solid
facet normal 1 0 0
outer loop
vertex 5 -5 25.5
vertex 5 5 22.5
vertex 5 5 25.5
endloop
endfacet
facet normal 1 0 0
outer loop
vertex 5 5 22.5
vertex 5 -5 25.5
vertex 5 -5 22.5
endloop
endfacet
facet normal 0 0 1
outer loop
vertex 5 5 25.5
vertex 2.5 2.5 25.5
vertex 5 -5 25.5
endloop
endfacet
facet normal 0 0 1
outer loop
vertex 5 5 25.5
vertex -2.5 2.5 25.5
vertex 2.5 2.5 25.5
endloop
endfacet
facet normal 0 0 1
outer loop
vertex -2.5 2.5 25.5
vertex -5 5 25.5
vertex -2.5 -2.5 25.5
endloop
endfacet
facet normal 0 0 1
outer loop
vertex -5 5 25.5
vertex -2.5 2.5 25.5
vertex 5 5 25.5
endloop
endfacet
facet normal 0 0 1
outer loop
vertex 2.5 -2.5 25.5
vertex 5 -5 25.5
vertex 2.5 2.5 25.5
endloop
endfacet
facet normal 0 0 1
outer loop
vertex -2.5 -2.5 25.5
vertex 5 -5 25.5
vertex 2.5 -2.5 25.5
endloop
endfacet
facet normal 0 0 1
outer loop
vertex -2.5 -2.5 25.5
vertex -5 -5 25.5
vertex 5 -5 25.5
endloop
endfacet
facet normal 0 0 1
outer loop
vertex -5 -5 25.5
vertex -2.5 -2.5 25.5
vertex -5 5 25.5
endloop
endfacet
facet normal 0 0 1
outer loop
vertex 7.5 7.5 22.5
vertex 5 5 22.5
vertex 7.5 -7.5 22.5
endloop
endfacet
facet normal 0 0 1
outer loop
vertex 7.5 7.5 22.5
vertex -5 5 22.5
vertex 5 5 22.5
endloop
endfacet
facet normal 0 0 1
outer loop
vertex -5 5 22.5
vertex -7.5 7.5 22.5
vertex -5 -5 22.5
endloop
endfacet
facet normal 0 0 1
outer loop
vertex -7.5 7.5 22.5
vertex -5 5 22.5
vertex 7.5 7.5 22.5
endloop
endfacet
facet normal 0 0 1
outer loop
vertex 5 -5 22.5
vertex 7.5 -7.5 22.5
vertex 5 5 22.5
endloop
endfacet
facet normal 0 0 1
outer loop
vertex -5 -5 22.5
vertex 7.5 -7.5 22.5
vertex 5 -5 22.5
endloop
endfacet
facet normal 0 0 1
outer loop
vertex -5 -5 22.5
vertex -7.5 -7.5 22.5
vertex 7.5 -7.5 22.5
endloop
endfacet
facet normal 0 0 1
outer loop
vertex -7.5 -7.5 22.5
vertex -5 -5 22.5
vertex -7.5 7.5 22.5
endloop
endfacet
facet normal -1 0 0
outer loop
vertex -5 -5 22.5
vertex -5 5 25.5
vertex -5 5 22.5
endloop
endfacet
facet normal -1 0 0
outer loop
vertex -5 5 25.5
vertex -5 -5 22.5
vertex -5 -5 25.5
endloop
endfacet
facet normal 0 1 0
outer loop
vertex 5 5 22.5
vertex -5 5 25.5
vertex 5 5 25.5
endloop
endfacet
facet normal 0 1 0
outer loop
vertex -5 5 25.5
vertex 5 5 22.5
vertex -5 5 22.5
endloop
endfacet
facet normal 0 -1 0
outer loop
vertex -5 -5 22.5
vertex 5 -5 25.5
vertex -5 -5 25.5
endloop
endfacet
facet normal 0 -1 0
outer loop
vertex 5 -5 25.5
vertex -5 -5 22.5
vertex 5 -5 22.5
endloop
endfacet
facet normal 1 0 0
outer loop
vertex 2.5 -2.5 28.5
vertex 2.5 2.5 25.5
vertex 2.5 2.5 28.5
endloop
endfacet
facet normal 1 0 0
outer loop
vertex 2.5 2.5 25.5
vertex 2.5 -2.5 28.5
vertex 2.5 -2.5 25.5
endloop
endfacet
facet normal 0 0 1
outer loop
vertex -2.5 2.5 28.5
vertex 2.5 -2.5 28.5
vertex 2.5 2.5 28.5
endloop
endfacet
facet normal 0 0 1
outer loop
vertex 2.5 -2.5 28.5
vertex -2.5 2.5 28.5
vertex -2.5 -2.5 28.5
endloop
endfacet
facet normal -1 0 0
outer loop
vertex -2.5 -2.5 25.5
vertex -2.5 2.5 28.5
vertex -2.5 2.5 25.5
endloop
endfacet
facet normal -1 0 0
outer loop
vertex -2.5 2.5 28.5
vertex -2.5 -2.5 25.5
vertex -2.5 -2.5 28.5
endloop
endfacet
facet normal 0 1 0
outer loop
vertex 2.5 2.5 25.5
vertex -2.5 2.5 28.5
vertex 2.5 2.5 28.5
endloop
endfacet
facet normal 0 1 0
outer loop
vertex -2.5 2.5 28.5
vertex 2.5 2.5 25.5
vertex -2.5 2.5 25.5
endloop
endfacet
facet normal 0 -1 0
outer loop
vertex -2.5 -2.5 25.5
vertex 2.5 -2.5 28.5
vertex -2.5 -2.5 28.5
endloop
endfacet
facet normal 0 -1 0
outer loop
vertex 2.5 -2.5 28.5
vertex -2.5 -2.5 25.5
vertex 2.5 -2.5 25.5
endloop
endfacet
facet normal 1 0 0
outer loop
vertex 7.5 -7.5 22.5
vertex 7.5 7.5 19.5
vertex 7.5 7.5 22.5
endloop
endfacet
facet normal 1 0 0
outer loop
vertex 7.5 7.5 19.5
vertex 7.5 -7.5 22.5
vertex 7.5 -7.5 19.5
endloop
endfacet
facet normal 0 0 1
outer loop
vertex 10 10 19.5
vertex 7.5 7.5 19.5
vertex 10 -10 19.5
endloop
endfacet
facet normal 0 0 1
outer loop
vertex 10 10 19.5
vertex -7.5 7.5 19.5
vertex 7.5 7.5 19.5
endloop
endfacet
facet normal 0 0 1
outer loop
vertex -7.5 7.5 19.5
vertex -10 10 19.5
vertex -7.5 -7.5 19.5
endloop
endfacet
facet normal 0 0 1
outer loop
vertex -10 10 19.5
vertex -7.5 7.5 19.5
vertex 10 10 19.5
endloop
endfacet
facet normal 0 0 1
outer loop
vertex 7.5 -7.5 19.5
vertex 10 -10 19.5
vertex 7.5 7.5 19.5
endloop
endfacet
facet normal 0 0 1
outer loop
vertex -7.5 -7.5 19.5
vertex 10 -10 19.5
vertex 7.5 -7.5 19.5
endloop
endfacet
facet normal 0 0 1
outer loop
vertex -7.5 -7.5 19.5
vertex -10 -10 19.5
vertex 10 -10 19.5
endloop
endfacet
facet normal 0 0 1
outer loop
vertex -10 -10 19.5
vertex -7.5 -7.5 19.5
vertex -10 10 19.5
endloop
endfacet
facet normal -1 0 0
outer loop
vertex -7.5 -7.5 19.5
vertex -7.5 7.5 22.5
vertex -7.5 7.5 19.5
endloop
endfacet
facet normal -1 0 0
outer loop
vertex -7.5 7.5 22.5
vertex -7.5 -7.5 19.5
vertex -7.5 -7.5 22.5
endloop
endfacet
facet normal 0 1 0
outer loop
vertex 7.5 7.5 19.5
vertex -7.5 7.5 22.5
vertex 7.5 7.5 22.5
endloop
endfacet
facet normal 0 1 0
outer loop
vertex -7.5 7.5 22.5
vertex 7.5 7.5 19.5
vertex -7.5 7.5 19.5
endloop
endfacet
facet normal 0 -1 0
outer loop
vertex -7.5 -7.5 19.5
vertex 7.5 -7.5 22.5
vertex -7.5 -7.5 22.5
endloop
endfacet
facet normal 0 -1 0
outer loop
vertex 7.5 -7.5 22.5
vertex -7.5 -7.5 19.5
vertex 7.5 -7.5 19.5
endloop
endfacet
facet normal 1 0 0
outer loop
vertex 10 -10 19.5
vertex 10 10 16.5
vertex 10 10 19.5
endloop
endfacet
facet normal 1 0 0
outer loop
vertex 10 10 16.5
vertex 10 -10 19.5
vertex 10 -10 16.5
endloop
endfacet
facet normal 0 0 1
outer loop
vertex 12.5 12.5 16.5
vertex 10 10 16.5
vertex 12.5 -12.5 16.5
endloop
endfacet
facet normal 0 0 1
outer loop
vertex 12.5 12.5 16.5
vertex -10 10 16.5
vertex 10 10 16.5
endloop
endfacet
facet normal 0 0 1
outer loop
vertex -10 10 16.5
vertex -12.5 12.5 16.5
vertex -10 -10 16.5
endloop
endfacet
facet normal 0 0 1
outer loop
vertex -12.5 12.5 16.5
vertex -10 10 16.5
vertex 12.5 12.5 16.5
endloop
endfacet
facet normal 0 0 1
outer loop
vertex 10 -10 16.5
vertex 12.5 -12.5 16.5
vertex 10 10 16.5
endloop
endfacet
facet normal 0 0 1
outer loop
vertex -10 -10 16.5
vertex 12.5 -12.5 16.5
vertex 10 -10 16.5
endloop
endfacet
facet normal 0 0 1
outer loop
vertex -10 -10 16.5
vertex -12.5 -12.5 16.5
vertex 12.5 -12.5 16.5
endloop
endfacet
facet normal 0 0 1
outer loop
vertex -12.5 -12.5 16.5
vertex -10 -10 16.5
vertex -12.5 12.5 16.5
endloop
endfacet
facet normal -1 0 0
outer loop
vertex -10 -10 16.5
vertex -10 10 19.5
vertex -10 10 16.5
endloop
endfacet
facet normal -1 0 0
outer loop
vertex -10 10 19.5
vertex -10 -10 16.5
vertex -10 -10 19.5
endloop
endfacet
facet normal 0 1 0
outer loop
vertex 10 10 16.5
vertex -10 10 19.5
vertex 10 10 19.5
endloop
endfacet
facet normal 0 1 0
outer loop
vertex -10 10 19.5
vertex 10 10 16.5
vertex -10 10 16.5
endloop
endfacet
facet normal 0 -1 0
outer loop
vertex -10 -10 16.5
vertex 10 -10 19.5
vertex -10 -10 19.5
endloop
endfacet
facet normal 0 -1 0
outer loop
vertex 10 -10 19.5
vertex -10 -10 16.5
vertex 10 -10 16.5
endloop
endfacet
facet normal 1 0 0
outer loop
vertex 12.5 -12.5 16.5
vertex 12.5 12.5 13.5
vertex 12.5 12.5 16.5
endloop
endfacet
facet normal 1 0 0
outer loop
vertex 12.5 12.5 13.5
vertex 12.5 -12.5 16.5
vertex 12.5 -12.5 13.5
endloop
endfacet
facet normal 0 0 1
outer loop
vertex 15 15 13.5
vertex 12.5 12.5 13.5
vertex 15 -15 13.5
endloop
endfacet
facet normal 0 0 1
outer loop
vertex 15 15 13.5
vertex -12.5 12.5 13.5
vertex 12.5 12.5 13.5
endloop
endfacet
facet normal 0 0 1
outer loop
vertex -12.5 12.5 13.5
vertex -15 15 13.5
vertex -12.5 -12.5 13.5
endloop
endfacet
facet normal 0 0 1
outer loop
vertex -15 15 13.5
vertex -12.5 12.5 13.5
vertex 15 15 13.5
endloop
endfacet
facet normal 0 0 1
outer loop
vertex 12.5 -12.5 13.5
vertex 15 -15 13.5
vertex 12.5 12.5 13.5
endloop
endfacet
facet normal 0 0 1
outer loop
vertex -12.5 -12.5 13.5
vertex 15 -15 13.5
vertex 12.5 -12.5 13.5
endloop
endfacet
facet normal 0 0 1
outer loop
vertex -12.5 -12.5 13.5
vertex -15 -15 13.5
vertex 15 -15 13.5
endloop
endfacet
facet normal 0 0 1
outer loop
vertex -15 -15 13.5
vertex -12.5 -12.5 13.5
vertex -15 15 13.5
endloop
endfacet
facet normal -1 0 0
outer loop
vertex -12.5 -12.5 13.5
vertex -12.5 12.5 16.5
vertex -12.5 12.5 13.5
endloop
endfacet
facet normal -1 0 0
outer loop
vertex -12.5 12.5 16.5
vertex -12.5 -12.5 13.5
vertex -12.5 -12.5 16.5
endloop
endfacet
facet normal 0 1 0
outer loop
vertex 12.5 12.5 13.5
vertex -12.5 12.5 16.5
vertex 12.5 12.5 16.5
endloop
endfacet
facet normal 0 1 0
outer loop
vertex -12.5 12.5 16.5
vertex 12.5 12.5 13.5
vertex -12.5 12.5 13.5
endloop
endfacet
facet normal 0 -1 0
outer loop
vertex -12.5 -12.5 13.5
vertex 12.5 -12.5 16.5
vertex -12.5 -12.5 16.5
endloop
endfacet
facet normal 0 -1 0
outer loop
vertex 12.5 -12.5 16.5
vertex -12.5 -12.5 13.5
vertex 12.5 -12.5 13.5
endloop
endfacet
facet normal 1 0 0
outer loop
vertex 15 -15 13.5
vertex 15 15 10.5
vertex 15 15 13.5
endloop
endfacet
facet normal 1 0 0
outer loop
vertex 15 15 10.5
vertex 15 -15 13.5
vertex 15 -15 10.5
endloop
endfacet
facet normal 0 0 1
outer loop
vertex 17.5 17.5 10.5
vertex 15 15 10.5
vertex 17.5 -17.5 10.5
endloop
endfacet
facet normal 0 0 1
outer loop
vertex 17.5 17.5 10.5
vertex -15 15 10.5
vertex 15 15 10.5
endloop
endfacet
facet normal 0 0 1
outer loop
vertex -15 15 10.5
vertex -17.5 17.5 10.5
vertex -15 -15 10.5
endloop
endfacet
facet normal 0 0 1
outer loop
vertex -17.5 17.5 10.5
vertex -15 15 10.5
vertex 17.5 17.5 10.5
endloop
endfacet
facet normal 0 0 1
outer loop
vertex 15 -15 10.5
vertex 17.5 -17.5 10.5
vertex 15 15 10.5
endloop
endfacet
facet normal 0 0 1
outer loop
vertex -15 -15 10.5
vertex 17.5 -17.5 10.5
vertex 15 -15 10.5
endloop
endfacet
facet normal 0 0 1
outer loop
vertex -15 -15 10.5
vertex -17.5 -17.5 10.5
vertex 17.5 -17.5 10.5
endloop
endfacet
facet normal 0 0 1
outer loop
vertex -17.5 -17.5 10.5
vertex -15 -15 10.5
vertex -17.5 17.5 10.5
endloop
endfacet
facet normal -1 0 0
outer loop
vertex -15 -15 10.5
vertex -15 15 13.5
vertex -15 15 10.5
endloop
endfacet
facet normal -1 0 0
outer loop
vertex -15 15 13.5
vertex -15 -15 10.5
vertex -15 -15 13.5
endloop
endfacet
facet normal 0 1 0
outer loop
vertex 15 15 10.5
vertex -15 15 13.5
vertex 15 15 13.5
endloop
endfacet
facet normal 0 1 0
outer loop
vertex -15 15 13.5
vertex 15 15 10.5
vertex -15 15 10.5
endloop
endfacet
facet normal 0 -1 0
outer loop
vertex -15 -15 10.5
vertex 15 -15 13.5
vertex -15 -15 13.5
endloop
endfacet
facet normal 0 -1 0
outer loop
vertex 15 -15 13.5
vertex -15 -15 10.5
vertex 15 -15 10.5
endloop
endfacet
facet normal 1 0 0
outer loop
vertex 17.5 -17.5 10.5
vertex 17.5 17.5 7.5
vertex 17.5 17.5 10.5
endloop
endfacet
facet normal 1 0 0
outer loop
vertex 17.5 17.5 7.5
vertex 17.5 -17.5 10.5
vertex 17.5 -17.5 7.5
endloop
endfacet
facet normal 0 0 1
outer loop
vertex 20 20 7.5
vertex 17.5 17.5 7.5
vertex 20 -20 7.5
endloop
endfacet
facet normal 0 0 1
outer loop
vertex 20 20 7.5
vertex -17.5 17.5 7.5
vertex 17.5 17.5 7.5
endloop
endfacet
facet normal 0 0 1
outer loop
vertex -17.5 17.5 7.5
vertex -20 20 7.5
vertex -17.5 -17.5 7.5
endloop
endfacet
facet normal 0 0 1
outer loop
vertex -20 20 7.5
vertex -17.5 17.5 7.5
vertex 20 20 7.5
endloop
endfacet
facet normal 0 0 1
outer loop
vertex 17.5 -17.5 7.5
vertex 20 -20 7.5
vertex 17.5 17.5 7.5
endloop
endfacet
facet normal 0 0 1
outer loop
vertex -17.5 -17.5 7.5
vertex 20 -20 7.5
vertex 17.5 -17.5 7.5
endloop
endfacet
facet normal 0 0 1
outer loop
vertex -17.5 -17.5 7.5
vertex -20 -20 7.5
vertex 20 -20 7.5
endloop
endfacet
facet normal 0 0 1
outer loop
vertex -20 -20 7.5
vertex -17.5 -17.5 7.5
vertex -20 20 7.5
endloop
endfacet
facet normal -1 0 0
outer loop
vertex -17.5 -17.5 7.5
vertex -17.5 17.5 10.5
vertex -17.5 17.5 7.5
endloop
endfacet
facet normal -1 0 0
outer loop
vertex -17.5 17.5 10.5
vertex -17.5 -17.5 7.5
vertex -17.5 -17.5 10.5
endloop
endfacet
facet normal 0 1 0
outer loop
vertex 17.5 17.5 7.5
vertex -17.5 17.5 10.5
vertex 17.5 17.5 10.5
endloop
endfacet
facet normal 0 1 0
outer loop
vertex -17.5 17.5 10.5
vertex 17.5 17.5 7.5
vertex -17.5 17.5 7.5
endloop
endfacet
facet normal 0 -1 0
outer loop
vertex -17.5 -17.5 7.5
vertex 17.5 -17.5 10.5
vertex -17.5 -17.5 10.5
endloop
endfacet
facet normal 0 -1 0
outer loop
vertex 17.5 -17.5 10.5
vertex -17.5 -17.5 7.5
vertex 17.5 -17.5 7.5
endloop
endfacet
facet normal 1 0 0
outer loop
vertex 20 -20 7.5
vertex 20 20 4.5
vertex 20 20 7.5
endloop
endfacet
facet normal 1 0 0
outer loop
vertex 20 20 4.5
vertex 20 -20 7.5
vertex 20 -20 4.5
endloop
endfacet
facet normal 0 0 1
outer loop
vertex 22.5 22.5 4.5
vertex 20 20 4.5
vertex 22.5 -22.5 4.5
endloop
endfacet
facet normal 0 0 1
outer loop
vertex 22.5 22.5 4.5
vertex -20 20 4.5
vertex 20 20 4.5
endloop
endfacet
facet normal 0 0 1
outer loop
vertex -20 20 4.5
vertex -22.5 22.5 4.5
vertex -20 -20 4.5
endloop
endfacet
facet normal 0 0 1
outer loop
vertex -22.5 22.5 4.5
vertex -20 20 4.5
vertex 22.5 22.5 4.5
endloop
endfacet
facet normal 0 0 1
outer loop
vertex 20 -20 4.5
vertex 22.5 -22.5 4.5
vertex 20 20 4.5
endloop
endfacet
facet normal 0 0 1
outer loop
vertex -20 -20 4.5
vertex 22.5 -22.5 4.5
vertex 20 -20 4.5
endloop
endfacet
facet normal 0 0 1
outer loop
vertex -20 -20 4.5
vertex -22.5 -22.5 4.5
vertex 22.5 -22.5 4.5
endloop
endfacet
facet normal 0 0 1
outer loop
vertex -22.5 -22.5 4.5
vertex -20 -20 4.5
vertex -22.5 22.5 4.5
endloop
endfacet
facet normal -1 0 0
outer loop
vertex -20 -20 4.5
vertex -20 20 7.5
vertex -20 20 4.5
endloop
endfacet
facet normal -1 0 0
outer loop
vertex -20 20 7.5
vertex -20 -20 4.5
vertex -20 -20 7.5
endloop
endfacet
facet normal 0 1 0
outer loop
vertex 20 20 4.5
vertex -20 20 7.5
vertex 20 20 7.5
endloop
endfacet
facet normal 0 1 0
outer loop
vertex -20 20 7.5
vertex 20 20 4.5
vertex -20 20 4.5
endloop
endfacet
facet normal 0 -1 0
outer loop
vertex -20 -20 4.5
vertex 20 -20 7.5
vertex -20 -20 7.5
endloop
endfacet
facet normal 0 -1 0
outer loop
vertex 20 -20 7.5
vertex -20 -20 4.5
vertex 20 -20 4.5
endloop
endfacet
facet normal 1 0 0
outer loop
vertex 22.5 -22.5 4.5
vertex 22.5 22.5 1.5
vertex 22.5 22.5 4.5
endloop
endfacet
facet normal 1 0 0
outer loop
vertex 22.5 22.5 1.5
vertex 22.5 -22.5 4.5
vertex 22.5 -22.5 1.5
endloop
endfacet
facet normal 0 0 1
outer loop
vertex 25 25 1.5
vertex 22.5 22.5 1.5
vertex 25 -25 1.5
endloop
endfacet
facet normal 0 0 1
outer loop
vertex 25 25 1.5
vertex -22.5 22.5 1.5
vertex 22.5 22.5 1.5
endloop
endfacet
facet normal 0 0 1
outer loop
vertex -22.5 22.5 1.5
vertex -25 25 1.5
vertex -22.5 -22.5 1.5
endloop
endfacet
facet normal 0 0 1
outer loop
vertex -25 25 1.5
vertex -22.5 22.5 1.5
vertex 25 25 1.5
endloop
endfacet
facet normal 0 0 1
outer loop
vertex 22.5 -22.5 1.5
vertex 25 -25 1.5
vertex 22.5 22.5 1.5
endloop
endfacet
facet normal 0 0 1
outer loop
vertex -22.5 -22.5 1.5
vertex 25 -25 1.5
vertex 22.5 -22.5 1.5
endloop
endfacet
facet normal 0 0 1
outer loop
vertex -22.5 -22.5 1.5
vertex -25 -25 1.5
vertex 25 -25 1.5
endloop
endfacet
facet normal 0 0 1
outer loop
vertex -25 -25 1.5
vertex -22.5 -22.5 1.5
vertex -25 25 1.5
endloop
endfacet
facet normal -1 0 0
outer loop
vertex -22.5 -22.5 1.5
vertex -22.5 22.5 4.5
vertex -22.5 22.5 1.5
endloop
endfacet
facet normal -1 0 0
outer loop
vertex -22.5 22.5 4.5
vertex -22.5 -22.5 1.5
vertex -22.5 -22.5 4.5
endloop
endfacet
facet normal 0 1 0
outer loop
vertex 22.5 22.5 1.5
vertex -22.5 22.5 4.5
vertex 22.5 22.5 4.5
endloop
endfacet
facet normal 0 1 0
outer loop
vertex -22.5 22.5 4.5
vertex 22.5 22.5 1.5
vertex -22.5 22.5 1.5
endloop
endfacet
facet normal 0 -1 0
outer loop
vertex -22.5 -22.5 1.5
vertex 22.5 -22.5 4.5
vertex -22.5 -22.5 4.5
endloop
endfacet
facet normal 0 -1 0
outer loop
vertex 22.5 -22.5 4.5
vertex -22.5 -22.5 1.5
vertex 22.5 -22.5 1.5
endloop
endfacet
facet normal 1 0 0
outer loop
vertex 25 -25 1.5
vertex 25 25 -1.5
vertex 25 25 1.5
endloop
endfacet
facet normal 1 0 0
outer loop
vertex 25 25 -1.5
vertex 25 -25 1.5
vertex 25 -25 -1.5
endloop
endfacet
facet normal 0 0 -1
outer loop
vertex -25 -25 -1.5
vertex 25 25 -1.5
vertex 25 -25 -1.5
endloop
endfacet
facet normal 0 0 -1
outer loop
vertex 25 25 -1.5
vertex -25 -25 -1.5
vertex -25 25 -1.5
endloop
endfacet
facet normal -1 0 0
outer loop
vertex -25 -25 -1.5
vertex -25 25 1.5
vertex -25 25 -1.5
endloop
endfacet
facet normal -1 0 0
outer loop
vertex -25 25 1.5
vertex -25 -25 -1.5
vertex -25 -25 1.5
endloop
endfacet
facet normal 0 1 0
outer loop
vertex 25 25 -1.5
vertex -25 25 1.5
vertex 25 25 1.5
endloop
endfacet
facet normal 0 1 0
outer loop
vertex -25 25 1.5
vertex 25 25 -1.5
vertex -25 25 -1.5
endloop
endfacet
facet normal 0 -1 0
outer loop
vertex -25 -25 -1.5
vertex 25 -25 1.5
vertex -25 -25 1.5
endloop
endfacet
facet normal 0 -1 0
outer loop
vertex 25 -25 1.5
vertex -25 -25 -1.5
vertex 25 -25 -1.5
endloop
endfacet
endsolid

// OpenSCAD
//-- Ejemplo de figura recursiva
//-- Zigurat, pirámide escalonada

//-- Parámetros
step=3; //-- Altura de cada nivel
dim=5;  //-- Dimensiones último nivel

//-- Módulo recursivo
//-- n: número de niveles
module zigurat(n){
    //-- Terminación: nivel 1 cubo superior
    if(n<=1){
        cube([dim,dim,step],center=true);
    }else{
        //-- Dibujar cubo nivel n
        cube([n*dim,n*dim,step],center=true);
        //-- Seguir con siguiente nivel
        translate([0,0,step])
            zigurat(n-1);
    }
}

//-- Pirámide de 10 niveles
zigurat(10);
